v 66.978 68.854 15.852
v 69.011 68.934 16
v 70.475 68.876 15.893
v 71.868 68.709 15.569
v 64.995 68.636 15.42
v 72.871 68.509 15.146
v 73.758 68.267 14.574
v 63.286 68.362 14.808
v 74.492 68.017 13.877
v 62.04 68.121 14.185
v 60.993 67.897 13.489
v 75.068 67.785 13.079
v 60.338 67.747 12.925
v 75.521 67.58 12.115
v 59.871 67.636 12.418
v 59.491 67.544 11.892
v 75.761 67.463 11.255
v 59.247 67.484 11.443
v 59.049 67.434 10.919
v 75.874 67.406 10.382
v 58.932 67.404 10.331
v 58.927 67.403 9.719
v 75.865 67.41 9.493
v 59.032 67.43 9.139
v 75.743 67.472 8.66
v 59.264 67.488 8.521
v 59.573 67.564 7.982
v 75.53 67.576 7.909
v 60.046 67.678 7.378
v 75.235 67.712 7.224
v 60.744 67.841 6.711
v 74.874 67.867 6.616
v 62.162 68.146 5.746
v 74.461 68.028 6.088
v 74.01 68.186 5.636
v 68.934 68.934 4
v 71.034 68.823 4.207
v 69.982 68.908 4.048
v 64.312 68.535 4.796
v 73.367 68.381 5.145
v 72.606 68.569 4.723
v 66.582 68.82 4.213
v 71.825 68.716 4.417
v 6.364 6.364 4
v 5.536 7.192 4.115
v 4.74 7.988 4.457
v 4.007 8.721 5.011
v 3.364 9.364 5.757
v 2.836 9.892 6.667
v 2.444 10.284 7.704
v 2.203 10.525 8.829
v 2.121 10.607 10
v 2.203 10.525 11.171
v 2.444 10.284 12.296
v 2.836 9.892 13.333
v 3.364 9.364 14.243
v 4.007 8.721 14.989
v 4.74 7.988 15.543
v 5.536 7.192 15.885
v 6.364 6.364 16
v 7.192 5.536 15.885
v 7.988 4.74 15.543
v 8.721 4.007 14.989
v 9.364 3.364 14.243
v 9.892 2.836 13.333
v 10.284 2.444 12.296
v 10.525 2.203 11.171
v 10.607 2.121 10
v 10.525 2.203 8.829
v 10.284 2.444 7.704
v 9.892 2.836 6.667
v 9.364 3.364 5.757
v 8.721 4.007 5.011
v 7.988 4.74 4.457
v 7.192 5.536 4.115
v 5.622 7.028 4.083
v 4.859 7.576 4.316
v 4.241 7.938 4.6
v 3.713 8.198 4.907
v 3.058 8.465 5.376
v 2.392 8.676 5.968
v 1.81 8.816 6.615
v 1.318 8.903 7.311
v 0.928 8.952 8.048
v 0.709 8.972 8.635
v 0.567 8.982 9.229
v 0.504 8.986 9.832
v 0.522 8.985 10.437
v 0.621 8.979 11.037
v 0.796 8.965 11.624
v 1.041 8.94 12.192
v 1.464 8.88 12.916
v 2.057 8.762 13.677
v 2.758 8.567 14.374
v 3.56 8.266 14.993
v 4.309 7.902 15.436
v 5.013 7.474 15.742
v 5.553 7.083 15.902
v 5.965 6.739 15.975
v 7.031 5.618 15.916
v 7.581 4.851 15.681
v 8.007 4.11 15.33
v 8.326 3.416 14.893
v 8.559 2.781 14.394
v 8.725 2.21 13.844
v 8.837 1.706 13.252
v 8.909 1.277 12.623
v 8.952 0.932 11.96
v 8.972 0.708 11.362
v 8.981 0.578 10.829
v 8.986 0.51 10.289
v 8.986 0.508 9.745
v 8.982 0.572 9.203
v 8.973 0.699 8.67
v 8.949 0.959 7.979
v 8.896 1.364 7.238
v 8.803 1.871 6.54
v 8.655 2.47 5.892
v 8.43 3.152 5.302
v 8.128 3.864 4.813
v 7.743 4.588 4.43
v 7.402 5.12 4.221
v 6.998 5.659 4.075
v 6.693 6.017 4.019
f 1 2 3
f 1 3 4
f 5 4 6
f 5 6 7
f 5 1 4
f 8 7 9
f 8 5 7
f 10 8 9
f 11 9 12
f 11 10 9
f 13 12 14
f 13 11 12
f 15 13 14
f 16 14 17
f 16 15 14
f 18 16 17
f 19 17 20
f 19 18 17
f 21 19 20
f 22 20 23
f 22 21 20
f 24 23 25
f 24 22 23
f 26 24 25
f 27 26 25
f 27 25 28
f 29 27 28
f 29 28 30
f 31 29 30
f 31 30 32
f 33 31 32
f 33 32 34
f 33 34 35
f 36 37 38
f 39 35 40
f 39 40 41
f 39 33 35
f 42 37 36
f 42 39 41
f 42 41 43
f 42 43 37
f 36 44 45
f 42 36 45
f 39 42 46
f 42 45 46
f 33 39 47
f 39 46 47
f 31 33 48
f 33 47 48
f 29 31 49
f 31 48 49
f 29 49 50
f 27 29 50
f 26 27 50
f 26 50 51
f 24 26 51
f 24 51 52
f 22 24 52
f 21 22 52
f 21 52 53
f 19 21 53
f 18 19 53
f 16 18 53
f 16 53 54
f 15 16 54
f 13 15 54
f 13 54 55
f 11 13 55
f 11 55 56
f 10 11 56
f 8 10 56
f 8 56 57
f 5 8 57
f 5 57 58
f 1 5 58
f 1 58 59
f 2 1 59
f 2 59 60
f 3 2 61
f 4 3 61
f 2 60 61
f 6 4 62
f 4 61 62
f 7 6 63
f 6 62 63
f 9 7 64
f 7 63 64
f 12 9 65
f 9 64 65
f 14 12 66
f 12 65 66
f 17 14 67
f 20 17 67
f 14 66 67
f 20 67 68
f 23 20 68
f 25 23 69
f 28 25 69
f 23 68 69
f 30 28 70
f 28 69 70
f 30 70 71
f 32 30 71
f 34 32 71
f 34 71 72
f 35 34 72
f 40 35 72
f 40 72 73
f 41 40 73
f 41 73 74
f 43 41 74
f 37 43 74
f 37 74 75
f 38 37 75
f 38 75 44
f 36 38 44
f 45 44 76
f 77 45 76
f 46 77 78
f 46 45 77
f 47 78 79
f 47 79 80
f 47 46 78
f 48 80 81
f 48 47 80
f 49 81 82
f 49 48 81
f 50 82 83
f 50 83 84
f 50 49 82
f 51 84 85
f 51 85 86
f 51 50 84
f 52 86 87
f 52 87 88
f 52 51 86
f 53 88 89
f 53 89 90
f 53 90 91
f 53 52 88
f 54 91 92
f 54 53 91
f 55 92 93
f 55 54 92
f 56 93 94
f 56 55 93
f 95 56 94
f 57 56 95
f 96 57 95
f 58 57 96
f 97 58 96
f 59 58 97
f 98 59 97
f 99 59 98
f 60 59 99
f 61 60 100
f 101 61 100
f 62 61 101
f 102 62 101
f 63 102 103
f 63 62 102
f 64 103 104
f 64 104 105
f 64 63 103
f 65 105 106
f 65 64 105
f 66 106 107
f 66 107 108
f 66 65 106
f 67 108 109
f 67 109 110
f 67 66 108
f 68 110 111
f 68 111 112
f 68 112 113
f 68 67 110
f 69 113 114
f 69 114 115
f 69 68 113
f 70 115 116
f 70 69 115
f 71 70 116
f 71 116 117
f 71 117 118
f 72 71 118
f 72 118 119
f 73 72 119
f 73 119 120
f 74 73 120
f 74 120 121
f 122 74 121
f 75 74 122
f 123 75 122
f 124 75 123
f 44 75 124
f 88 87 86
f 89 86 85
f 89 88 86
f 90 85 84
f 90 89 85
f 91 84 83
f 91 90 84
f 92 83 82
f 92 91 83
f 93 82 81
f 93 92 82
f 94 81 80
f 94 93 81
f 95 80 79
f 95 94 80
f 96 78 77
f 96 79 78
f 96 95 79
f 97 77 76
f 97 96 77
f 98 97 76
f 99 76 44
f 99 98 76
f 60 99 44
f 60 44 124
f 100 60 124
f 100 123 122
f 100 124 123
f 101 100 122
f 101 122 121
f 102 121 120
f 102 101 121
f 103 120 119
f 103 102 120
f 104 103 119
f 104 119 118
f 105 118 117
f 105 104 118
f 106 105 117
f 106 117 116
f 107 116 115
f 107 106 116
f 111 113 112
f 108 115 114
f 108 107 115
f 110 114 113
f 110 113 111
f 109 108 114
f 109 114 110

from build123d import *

# Parameters (mm, degrees)
SKETCH9_R                       = 9
SKETCH9_R_2                     = 8
BOSS_EXTRUDE1_DEPTH             = 20
SKETCH10_W                      = 4.934959926
SKETCH10_H                      = 0.2
CUT_EXTRUDE1_DEPTH              = 20
SKETCH11_R                      = 6
BOSS_EXTRUDE2_DEPTH             = 100
BOSS_EXTRUDE2_DIRECTION_2_REACH = 23.728
SKETCH12_R                      = 6
BOSS_EXTRUDE3_DEPTH             = 100
BOSS_EXTRUDE3_DIRECTION_2_REACH = 74.864
SKETCH14_R                      = 12.5
CUT_EXTRUDE3_DEPTH              = 82.317279836
CUT_EXTRUDE3_DEPTH_BACK         = 82.317279836
CUT_EXTRUDE4_DEPTH              = 21.0000001


with BuildPart() as part:
    # Sketch9 → Boss-Extrude1 (new body)
    with BuildSketch(Plane.XY):
        Circle(SKETCH9_R)
        Circle(SKETCH9_R_2, mode=Mode.SUBTRACT)
    extrude(amount=BOSS_EXTRUDE1_DEPTH)

    # Sketch10 → Cut-Extrude1 (cut)
    with BuildSketch(Plane.XY.offset(20)):
        with Locations((8, 0)):
            Rectangle(SKETCH10_W, SKETCH10_H)
    extrude(amount=-CUT_EXTRUDE1_DEPTH, mode=Mode.SUBTRACT)

    # Sketch11 → Boss-Extrude2 (add)
    with BuildSketch(Plane(origin=(-6.363961031, 6.363961031, 0), x_dir=(0, 0, -1), z_dir=(-0.707106781, 0.707106781, 0))):
        with Locations((-10, 0)):
            Circle(SKETCH11_R)
    extrude(amount=BOSS_EXTRUDE2_DEPTH)

    # Sketch11 → Boss-Extrude2 direction 2 (add, up to next)
    with BuildSketch(Plane(origin=(-6.363961031, 6.363961031, 0), x_dir=(0, 0, -1), z_dir=(-0.707106781, 0.707106781, 0)), mode=Mode.PRIVATE) as boss_extrude2_direction_2_sk1:
        with Locations((-10, 0)):
            Circle(SKETCH11_R)
    boss_extrude2_direction_2_tool1 = extrude(boss_extrude2_direction_2_sk1.sketch, amount=-BOSS_EXTRUDE2_DIRECTION_2_REACH, mode=Mode.PRIVATE) - part.part
    add(boss_extrude2_direction_2_tool1.solids().sort_by_distance((-6.363961, 6.363961, 10))[0])
    add(boss_extrude2_direction_2_tool1.solids().sort_by_distance((-6.363961, 6.363961, 10))[1])

    # Sketch12 → Boss-Extrude3 (add)
    with BuildSketch(Plane(origin=(6.363961031, 6.363961031, 0), x_dir=(0, 0, -1), z_dir=(0.707106781, 0.707106781, 0))):
        with Locations((-10, 0)):
            Circle(SKETCH12_R)
    extrude(amount=BOSS_EXTRUDE3_DEPTH)

    # Sketch12 → Boss-Extrude3 direction 2 (add, up to next)
    with BuildSketch(Plane(origin=(6.363961031, 6.363961031, 0), x_dir=(0, 0, -1), z_dir=(0.707106781, 0.707106781, 0)), mode=Mode.PRIVATE) as boss_extrude3_direction_2_sk1:
        with Locations((-10, 0)):
            Circle(SKETCH12_R)
    boss_extrude3_direction_2_tool1 = extrude(boss_extrude3_direction_2_sk1.sketch, amount=-BOSS_EXTRUDE3_DIRECTION_2_REACH, mode=Mode.PRIVATE) - part.part
    add(boss_extrude3_direction_2_tool1.solids().sort_by_distance((6.363961, 6.363961, 10))[0])
    add(boss_extrude3_direction_2_tool1.solids().sort_by_distance((6.363961, 6.363961, 10))[1])

    # Sketch14 → Cut-Extrude3 (cut, two sides)
    with BuildSketch(Plane(origin=(0, 0, 0), x_dir=(0, 0, -1), z_dir=(1, 0, 0))) as cut_extrude3_sk:
        with Locations((-10, 79.9)):
            Circle(SKETCH14_R)
    extrude(amount=CUT_EXTRUDE3_DEPTH, mode=Mode.SUBTRACT)
    extrude(cut_extrude3_sk.sketch, amount=-CUT_EXTRUDE3_DEPTH_BACK, mode=Mode.SUBTRACT)

    # Sketch15 → Cut-Extrude4 (cut, through all)
    with BuildSketch(Plane.XY.offset(20)):
        with BuildLine():
            Line((-9, 0), (-109.979142128, 0))
            Line((-109.979142128, 0), (-109.979142128, 78.923804152))
            Line((-109.979142128, 78.923804152), (0, 78.923804152))
            Line((0, 78.923804152), (0, 9))
            ThreePointArc((0, 9), (6.363961031, -6.363961031), (-9, 0))
        make_face()
    extrude(amount=-CUT_EXTRUDE4_DEPTH, mode=Mode.SUBTRACT)


solid = part.part
